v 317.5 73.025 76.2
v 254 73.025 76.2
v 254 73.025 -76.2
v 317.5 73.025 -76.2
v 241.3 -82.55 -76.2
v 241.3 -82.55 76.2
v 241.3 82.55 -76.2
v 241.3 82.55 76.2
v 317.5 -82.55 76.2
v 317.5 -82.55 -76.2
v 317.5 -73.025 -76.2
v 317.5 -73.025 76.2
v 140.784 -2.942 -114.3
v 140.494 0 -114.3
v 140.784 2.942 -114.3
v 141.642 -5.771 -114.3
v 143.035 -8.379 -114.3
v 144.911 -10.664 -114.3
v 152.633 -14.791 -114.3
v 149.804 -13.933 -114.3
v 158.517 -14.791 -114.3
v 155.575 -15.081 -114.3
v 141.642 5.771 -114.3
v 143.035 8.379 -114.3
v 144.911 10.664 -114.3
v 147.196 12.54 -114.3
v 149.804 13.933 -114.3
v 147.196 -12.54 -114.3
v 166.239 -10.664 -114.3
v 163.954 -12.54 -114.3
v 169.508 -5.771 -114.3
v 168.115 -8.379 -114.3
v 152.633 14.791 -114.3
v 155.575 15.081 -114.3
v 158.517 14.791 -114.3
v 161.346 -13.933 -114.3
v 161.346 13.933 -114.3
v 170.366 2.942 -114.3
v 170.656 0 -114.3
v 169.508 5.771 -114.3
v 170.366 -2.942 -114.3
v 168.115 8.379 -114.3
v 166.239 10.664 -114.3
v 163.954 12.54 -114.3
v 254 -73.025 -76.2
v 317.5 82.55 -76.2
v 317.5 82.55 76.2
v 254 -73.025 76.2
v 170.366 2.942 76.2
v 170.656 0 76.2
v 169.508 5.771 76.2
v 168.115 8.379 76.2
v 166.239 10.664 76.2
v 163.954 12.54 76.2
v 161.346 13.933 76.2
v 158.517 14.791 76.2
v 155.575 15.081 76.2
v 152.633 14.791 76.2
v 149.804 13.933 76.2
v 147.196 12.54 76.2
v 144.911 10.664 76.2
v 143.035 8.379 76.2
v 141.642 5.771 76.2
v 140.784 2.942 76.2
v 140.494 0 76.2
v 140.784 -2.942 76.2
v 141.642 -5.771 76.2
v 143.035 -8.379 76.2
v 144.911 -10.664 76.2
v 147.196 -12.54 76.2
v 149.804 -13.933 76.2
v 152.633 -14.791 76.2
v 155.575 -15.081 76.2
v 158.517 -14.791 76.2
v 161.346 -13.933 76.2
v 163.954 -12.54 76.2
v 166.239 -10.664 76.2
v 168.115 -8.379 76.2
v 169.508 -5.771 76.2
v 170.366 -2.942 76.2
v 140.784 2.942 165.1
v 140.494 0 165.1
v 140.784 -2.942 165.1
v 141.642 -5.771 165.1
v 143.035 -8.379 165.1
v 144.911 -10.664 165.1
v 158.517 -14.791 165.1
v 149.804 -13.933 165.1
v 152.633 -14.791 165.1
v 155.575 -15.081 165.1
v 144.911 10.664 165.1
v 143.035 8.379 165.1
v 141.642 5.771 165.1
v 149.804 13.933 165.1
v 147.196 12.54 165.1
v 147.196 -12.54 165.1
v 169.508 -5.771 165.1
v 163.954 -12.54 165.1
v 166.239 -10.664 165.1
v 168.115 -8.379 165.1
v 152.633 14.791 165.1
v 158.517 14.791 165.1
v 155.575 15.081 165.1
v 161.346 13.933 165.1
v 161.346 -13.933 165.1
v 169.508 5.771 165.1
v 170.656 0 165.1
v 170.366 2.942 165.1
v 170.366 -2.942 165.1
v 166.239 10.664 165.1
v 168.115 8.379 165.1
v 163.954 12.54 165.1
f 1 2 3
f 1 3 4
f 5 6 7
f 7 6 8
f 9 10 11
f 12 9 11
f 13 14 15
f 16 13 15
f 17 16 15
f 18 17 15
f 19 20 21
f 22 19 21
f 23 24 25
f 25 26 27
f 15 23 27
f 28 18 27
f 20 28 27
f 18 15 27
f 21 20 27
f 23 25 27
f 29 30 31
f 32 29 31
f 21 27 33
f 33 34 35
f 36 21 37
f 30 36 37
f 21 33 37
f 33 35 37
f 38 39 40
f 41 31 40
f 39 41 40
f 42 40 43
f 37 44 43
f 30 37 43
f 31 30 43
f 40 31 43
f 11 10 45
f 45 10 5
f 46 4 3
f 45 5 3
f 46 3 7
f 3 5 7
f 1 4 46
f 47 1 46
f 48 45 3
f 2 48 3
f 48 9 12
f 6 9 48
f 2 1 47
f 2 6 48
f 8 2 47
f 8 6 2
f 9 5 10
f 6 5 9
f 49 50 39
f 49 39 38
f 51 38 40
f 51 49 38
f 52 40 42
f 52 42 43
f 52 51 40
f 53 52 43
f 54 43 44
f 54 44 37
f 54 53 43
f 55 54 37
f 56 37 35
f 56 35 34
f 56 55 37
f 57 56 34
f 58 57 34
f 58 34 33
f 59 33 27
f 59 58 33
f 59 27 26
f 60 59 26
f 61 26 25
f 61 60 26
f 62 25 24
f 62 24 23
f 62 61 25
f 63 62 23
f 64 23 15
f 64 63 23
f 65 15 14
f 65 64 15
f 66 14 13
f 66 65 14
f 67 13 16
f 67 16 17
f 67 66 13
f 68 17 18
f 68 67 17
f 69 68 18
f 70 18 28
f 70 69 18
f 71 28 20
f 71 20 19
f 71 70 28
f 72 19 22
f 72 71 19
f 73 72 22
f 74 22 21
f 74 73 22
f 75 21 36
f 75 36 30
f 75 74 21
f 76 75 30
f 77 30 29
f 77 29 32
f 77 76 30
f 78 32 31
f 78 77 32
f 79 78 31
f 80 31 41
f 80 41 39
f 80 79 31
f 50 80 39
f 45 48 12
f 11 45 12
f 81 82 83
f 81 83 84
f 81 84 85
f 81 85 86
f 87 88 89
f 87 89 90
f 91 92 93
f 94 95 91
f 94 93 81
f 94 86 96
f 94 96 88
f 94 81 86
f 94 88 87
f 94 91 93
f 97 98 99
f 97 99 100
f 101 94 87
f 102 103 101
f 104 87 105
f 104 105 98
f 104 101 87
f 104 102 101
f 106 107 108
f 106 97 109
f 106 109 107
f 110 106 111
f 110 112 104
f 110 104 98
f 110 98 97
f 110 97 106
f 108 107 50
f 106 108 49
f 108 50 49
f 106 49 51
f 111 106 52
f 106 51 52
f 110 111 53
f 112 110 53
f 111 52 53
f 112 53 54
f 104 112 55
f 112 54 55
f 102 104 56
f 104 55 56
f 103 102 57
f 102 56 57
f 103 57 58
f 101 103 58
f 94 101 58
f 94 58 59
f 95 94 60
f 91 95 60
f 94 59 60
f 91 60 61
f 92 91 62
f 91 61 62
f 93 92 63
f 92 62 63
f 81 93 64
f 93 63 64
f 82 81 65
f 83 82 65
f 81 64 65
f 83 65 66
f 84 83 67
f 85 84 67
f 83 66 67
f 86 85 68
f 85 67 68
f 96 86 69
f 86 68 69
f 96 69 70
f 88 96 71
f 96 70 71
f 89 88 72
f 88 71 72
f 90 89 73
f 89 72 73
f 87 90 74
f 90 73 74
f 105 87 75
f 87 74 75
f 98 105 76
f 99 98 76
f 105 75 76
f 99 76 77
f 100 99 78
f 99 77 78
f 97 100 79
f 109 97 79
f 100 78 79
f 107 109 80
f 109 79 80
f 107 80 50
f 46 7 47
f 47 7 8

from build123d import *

# Parameters (mm, degrees)
F1_W          = 165.1
F1_H          = 152.4
F2_DEPTH      = 12.7
F2_DEPTH_BACK = 63.5
F3_R          = 15.08125
F4_DEPTH      = 190.5
F4_DEPTH_BACK = 88.9
F5_W          = 63.5
F5_H          = 146.05
F6_DEPTH      = 190.501


with BuildPart() as f2:
    # F1 (on offset) → F2 (new body, two sides)
    with BuildSketch(Plane.YZ.offset(254)) as f2_sk:
        Rectangle(F1_W, F1_H)
    extrude(amount=-F2_DEPTH)
    extrude(f2_sk.sketch, amount=F2_DEPTH_BACK)

    # F5 (on face) → F6 (cut, through all)
    with BuildSketch(Plane.XY.offset(76.2)):
        with Locations((285.75, 0)):
            Rectangle(F5_W, F5_H)
    extrude(amount=-F6_DEPTH, mode=Mode.SUBTRACT)


with BuildPart() as f4:
    # F3 (on face) → F4 (new body, two sides)
    with BuildSketch(Plane.XY.offset(76.2)) as f4_sk:
        with Locations((155.575, 0)):
            Circle(F3_R)
    extrude(amount=-F4_DEPTH)
    extrude(f4_sk.sketch, amount=F4_DEPTH_BACK)


solid = Compound([f2.part, f4.part])
